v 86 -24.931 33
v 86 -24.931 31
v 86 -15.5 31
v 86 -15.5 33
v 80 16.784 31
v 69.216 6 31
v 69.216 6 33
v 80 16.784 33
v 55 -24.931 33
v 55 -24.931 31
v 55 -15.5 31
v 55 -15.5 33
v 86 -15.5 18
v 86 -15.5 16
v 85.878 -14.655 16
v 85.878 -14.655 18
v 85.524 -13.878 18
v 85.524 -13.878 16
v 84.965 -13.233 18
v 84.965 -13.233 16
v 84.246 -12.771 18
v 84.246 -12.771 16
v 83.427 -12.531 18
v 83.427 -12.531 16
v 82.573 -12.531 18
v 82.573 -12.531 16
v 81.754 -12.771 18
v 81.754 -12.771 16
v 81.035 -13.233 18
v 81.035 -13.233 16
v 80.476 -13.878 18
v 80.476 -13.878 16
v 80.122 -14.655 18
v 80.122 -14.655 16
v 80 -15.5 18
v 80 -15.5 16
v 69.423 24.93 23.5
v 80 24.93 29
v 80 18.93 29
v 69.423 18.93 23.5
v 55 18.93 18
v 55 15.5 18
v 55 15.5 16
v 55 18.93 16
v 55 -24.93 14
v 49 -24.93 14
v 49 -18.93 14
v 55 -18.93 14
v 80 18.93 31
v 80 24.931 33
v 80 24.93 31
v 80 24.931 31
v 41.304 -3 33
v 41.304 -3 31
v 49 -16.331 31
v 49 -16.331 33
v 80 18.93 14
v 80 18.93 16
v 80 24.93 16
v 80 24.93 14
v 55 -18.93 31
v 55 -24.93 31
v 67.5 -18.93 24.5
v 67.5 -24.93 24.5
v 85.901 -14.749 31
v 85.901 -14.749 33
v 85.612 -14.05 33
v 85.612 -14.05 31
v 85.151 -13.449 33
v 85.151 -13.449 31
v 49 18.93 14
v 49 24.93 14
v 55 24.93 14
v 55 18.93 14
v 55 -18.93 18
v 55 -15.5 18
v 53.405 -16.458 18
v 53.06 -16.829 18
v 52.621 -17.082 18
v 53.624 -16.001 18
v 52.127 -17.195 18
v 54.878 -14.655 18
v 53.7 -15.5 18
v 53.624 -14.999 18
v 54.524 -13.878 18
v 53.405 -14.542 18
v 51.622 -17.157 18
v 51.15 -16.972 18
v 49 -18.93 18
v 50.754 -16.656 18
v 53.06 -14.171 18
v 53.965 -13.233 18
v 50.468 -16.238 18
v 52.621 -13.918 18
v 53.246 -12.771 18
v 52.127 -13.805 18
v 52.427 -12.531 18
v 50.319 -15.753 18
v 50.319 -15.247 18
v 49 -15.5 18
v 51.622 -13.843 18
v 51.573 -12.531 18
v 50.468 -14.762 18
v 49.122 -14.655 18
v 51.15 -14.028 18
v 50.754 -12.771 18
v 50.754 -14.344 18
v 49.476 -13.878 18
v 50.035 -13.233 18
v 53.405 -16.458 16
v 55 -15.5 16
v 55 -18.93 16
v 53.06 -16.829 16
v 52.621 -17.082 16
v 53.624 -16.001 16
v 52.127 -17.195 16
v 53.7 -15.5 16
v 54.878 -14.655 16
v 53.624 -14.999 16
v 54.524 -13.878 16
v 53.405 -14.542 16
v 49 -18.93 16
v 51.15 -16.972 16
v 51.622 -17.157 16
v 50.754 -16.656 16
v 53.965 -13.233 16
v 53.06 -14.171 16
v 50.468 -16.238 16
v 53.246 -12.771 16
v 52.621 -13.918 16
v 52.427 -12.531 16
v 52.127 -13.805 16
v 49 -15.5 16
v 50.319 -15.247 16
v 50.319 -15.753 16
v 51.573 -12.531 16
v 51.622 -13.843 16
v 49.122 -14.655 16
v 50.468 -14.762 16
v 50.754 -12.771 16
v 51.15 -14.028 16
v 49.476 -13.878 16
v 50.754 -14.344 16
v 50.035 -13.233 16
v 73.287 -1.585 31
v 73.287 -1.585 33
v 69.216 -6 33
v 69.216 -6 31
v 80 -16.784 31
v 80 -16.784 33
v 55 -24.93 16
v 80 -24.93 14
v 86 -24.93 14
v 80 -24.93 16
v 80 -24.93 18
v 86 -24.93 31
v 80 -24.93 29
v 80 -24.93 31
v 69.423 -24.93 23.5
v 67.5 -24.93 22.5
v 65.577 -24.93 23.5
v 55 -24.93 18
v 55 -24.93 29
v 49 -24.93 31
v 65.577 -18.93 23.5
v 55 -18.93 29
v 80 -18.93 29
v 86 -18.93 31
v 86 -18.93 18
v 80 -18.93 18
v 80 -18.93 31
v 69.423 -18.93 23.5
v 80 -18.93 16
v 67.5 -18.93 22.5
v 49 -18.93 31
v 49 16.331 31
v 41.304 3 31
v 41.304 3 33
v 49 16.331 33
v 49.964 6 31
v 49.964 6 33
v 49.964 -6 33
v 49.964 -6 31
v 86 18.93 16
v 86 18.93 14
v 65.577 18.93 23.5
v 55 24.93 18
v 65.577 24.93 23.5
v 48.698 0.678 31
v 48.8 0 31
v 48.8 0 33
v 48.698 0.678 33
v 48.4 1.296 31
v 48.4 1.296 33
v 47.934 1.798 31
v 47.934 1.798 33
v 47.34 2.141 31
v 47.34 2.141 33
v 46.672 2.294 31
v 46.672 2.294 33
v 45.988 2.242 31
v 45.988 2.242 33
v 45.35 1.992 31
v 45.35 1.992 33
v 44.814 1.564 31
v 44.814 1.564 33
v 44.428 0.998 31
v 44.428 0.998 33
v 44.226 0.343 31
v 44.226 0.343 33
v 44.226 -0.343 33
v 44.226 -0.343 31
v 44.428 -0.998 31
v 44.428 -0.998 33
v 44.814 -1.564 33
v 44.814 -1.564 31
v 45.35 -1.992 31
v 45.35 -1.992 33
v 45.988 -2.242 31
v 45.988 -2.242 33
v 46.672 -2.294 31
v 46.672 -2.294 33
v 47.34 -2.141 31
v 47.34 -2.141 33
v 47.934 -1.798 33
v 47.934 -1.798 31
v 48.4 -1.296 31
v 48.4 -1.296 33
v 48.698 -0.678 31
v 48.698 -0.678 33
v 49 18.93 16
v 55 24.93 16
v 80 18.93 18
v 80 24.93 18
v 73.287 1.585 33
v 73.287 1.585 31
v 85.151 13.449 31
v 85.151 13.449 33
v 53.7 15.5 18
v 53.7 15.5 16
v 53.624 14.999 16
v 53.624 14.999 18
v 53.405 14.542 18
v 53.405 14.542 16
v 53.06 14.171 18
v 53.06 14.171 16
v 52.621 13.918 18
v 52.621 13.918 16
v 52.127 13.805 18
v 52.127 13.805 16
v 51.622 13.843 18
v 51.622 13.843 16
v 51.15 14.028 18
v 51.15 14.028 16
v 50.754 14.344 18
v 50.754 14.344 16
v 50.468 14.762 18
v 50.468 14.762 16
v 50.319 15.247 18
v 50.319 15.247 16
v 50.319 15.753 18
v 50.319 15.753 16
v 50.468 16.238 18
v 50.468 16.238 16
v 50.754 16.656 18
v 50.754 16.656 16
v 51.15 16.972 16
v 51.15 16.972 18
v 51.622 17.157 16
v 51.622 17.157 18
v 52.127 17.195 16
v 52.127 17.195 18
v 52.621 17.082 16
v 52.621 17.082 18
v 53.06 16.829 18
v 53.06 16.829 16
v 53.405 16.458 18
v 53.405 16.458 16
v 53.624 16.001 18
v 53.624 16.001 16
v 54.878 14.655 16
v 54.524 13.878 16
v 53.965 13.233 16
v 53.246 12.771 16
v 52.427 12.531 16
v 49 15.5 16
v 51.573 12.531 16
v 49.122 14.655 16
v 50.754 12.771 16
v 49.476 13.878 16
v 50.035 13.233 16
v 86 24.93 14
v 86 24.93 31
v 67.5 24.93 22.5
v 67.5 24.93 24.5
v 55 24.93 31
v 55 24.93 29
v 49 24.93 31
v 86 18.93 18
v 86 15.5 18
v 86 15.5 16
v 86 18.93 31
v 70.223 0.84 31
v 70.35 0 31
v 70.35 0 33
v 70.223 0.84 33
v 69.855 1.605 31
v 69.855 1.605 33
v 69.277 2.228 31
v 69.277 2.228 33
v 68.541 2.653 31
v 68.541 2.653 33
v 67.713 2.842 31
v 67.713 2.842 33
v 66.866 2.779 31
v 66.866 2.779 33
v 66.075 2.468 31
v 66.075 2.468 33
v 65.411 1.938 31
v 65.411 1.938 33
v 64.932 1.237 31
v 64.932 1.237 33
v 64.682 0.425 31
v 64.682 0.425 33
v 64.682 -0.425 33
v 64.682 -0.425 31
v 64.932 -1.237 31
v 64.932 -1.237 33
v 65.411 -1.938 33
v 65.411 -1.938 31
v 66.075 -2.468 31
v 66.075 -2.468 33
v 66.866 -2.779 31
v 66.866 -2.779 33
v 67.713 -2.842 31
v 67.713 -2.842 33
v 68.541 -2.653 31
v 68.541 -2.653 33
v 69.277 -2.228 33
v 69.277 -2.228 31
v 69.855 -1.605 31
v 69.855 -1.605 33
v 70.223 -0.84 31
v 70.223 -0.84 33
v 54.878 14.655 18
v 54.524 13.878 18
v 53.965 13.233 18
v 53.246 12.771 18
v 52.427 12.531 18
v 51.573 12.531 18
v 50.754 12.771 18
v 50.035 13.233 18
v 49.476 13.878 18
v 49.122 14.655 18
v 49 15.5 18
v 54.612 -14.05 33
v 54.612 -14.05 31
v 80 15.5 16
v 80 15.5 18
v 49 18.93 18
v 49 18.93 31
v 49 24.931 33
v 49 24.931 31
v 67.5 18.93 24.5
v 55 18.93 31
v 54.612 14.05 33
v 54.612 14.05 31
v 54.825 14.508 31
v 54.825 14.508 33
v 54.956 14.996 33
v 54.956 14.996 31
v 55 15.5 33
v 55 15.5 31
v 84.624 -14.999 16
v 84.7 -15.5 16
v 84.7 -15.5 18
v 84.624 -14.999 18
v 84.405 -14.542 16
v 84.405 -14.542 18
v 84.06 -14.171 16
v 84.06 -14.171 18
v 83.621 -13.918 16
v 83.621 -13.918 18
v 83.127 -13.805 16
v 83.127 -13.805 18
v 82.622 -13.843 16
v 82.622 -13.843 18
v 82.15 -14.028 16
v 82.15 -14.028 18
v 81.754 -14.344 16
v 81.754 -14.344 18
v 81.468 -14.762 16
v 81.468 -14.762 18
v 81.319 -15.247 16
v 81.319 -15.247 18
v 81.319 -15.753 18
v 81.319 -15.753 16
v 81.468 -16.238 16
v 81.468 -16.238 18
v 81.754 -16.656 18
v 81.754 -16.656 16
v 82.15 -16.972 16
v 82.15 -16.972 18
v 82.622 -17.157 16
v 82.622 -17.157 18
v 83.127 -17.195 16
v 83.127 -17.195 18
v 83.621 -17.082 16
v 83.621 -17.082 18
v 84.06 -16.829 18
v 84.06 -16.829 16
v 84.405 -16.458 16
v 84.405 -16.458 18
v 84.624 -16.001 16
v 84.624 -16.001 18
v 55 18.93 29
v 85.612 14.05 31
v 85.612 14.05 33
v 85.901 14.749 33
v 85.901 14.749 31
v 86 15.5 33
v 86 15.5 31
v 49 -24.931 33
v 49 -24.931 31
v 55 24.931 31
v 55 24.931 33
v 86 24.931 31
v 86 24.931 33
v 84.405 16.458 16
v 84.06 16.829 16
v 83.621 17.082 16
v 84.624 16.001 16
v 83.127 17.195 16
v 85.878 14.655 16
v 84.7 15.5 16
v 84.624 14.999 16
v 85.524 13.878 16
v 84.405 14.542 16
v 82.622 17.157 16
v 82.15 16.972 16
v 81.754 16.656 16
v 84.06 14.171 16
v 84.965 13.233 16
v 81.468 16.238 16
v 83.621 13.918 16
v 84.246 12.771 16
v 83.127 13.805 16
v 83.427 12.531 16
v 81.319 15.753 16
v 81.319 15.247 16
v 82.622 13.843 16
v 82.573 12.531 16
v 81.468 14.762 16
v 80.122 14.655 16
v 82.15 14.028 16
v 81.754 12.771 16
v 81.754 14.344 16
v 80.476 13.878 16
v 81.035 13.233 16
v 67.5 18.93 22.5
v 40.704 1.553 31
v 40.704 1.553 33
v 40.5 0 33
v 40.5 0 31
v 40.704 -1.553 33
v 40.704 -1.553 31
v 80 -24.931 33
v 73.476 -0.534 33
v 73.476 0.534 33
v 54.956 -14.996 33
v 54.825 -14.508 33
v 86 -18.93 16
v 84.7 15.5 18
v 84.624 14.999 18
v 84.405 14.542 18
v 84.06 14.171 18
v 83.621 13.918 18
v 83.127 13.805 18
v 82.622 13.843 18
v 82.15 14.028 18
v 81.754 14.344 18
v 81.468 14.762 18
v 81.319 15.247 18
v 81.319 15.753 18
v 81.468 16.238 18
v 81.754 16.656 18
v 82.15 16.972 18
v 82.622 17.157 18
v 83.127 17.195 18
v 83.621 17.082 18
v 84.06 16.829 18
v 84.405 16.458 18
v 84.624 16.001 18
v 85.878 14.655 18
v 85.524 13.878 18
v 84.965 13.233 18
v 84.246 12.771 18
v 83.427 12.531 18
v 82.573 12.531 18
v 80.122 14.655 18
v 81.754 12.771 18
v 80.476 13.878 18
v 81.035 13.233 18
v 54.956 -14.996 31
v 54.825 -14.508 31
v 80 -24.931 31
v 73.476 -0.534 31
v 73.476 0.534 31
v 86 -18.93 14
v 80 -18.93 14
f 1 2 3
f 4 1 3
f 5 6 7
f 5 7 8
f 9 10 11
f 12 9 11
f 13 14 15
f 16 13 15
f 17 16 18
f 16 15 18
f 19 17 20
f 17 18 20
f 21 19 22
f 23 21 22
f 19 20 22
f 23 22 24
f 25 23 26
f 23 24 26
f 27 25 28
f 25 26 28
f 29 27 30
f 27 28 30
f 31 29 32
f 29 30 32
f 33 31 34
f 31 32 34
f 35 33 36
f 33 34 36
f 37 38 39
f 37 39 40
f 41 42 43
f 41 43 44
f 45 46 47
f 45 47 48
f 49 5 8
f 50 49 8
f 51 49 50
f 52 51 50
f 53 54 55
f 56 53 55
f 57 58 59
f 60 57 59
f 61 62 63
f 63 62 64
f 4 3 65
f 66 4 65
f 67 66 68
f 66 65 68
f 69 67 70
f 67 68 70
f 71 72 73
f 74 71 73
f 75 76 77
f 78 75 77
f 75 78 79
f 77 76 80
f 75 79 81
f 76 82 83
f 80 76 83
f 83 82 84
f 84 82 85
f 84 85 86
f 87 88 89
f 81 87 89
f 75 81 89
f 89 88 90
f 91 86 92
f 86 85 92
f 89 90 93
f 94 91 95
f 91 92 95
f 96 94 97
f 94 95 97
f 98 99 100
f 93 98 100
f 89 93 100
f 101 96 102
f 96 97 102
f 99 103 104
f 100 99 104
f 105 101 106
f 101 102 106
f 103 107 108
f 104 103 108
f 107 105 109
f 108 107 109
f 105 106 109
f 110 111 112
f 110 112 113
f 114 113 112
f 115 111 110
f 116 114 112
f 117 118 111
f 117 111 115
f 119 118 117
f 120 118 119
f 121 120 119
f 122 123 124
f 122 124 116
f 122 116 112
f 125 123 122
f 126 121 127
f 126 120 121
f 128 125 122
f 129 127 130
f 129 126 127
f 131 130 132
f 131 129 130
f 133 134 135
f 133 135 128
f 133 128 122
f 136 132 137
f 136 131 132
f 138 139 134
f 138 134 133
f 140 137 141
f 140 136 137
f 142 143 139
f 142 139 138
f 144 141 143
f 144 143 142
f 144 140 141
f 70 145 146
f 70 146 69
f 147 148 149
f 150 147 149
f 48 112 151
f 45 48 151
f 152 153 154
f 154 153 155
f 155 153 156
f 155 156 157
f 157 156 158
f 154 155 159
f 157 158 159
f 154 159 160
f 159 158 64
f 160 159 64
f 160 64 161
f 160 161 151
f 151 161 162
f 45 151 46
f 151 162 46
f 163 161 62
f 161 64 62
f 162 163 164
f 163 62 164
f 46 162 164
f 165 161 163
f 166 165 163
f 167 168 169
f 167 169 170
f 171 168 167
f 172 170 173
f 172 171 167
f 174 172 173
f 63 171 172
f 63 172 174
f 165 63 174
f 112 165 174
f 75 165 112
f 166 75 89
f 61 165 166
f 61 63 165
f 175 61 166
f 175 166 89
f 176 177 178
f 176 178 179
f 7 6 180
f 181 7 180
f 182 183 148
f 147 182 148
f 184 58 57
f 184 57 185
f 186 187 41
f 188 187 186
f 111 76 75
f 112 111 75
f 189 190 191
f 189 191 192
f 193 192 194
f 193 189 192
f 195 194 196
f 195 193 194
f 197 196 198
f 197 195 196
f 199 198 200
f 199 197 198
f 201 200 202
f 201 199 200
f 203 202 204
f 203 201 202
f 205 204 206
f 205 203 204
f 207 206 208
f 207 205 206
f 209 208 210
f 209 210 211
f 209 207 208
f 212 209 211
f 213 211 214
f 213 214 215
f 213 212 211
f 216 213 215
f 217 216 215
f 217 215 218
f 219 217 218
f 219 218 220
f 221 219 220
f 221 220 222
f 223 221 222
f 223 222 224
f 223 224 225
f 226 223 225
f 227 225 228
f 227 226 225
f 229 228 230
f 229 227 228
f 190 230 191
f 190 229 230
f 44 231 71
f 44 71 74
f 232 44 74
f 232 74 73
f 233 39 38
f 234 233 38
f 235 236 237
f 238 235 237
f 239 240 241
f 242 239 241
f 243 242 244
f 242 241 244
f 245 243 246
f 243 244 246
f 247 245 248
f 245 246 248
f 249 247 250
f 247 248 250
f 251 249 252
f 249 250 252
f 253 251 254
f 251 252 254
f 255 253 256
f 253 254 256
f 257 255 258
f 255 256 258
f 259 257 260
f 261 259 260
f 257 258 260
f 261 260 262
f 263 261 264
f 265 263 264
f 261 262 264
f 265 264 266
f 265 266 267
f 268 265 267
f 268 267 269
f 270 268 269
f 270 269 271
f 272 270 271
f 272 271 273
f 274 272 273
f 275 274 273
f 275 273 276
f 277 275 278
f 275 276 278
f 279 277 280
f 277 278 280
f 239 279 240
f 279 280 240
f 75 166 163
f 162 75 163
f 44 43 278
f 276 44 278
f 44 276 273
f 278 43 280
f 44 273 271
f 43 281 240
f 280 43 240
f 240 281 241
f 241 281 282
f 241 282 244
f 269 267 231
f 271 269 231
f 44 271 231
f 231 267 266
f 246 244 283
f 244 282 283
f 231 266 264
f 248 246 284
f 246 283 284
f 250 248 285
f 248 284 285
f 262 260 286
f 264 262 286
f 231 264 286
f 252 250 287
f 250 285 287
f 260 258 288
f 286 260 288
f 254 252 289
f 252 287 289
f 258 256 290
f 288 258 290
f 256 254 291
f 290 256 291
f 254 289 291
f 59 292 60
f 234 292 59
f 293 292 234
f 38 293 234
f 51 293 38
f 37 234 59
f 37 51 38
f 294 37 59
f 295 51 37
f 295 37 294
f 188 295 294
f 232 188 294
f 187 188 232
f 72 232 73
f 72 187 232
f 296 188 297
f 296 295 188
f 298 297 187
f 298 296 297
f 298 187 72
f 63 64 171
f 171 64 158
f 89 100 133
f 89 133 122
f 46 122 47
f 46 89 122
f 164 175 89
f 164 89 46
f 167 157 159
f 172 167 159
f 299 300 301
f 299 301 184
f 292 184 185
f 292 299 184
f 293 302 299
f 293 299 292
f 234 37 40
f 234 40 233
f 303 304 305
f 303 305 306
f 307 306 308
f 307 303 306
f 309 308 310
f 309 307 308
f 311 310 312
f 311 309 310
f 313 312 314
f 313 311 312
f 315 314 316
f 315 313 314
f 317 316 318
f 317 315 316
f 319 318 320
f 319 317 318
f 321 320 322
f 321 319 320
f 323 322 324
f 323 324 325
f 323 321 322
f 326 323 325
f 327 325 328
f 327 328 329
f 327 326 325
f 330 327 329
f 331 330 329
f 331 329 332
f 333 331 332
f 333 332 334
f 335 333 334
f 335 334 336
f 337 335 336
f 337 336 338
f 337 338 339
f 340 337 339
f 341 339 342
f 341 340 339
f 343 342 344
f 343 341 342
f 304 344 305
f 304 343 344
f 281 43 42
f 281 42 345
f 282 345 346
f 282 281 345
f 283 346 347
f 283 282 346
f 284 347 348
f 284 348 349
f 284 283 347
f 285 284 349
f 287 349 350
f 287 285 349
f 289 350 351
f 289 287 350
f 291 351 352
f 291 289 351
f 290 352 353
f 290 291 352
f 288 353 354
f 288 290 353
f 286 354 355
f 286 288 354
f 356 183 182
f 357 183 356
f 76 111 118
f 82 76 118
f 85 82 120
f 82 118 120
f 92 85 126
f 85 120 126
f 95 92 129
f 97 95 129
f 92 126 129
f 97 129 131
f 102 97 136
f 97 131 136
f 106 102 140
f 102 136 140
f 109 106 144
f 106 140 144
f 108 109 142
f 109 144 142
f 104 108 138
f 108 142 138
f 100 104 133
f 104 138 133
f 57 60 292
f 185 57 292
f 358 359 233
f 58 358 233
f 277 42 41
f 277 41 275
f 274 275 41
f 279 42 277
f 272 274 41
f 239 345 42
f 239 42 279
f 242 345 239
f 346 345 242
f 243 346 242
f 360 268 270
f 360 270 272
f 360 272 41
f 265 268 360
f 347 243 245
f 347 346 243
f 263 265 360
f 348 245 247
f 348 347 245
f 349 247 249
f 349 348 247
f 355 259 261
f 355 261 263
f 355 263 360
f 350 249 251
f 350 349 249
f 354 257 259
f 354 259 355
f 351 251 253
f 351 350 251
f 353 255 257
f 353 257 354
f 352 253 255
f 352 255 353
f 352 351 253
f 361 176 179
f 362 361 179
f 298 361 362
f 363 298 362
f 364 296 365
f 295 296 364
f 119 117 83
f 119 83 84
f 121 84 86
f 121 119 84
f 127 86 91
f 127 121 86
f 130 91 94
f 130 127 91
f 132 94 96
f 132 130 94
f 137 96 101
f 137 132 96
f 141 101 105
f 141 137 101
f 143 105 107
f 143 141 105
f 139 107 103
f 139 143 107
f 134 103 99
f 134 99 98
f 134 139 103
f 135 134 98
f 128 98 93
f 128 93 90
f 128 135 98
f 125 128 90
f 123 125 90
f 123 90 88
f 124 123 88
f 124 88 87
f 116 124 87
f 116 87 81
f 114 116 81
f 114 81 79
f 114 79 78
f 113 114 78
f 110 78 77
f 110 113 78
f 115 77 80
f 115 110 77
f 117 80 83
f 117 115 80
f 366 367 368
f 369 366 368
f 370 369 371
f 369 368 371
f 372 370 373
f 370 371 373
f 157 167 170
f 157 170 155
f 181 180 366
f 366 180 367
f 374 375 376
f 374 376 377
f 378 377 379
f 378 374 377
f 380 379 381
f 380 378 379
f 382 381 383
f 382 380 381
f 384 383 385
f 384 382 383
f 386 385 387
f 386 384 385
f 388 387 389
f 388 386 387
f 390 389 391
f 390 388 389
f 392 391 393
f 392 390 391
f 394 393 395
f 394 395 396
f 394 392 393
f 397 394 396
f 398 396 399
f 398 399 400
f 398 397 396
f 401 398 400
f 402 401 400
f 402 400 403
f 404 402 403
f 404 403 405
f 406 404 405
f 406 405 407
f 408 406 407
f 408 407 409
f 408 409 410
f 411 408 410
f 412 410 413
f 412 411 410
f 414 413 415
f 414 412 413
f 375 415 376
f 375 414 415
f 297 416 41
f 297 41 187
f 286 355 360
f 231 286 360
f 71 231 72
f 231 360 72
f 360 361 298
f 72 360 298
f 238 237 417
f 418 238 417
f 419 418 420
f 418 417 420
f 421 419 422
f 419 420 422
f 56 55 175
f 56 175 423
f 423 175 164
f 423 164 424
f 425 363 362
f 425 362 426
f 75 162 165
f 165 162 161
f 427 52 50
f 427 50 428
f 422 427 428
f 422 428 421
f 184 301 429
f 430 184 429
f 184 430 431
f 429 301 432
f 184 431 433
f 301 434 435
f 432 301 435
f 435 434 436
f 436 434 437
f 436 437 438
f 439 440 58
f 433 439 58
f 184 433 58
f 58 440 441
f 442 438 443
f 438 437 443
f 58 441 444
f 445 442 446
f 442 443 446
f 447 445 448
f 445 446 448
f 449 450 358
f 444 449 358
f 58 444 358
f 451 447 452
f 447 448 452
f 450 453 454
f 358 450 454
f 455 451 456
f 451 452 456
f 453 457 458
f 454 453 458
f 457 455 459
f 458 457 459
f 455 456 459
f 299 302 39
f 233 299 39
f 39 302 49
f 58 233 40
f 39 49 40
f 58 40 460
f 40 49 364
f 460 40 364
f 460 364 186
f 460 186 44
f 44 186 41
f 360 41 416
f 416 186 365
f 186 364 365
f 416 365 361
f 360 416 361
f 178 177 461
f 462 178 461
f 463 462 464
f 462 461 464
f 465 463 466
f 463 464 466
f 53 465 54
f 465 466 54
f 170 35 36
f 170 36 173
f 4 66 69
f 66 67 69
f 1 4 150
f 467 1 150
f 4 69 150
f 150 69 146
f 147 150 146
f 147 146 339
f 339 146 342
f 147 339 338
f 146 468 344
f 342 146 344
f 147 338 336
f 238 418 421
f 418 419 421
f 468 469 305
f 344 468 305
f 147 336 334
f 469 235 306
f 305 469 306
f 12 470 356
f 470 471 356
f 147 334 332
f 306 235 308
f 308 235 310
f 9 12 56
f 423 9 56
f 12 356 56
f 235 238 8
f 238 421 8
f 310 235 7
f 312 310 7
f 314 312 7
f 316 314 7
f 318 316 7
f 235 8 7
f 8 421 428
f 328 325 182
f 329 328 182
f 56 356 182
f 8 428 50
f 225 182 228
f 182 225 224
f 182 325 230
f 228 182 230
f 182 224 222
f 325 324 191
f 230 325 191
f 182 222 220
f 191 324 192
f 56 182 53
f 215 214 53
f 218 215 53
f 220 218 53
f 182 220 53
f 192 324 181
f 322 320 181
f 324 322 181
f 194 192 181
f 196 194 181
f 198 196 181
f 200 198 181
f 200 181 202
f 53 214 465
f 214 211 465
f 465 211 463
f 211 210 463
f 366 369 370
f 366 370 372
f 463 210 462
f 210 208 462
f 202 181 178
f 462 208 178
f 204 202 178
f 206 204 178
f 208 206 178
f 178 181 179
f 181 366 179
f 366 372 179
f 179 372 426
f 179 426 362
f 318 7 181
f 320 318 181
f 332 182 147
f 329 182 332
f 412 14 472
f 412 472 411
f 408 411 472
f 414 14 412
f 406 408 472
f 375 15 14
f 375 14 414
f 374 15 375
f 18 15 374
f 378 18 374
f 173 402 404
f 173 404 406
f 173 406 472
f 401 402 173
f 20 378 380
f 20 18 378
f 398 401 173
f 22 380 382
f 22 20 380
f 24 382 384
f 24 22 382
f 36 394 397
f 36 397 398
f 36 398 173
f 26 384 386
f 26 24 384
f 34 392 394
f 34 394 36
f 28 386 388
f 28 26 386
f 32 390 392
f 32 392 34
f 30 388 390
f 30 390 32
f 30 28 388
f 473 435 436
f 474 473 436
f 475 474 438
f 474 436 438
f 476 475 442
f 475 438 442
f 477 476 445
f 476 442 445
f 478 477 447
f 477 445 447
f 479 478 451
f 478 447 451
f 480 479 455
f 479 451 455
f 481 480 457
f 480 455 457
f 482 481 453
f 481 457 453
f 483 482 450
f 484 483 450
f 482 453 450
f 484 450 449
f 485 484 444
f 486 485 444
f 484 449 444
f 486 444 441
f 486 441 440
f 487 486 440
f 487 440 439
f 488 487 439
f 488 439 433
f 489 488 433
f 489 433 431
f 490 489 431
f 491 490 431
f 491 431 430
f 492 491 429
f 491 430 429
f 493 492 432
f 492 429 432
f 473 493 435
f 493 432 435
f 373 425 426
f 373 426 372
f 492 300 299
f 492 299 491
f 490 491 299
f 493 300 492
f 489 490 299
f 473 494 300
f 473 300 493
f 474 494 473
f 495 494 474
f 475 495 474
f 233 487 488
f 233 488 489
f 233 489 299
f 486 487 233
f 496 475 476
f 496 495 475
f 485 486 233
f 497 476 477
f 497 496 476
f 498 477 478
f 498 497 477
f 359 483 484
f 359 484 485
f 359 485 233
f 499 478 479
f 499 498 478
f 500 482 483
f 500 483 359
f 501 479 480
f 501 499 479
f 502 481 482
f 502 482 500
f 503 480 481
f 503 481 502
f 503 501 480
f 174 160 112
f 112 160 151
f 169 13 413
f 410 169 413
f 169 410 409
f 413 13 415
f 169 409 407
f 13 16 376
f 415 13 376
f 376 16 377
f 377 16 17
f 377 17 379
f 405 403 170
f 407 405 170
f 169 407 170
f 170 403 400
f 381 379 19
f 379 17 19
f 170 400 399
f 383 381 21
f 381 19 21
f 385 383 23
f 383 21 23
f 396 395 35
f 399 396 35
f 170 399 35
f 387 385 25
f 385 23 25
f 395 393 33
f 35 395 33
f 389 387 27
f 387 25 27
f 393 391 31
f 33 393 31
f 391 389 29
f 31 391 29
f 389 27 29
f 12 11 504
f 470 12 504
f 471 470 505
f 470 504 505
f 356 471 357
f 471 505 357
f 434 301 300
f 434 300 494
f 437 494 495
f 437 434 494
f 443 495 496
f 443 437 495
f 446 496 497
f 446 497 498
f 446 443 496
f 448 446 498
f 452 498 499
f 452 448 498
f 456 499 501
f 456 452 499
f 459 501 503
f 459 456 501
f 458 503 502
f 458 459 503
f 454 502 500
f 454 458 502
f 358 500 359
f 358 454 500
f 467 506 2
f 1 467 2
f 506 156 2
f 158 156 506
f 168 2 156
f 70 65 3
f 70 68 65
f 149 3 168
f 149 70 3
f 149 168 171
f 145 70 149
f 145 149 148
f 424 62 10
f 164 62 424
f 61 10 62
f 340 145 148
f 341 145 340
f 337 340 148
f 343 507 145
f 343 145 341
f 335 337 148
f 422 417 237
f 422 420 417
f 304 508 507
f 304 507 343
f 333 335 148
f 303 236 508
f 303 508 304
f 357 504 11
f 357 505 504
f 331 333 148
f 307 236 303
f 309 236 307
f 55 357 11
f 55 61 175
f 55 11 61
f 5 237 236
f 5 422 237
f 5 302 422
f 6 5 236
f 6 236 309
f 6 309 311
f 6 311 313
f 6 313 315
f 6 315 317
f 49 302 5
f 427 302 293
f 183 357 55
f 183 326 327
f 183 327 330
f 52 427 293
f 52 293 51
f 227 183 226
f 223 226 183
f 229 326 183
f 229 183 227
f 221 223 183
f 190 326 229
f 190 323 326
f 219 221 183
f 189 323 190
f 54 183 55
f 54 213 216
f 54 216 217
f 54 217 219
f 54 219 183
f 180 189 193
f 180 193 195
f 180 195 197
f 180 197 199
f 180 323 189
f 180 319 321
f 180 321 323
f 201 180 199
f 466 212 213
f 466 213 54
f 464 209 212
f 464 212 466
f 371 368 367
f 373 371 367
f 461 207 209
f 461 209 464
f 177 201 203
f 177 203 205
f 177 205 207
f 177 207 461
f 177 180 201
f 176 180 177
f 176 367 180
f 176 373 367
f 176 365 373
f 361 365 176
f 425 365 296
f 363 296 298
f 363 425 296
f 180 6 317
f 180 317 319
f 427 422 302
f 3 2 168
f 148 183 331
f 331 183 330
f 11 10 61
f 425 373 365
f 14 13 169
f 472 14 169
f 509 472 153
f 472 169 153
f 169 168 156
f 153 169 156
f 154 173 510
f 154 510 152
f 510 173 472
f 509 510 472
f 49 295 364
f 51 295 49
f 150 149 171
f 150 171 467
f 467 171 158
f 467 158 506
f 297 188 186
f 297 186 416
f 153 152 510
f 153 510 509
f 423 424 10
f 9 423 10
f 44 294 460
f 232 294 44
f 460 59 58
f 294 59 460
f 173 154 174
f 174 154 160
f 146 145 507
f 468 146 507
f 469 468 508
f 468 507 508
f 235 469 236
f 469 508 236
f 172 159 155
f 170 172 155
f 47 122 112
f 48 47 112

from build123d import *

# Parameters (mm, degrees)
SKETCH094_R                     = 2.3
SKETCH094_R_2                   = 2.85
PAD048_DEPTH                    = 2
SKETCH097_W                     = 6
SKETCH097_H                     = 6
PAD050_DEPTH                    = 17
SKETCH098_R                     = 1.7
PAD051_DEPTH                    = 2
SKETCH098_LINEARPATTERN001_2_R  = 1.7
PAD051_LINEARPATTERN001_2_DEPTH = 2
SKETCH097_LINEARPATTERN001_2_W  = 6
SKETCH097_LINEARPATTERN001_2_H  = 6
PAD050_LINEARPATTERN001_2_DEPTH = 17
PAD052_DEPTH                    = 6


with BuildPart() as part:
    # Sketch094 → Pad048 (new body)
    with BuildSketch(Plane.XY):
        with BuildLine():
            Line((3.464102, 6), (21, 6))
            Line((22.716302, 6), (21, 6))
            Line((22.716302, 6), (33.500258, 16.783955))
            Line((33.500258, 16.783955), (33.500258, 24.930573))
            Line((33.500258, 24.930573), (39.500258, 24.930573))
            Line((39.500258, 24.930573), (39.500258, 15.5))
            ThreePointArc((38.650792, 13.449208), (39.279489, 14.390119), (39.500258, 15.5))
            Line((26.786802, 1.585219), (38.650792, 13.449208))
            ThreePointArc((26.786802, -1.585219), (27, 0), (26.786802, 1.585219))
            Line((26.786802, -1.585219), (38.650792, -13.449208))
            ThreePointArc((39.500258, -15.5), (39.279489, -14.390119), (38.650792, -13.449208))
            Line((39.500258, -24.930573), (39.500258, -15.5))
            Line((33.500258, -24.930573), (39.500258, -24.930573))
            Line((33.500258, -16.783955), (33.500258, -24.930573))
            Line((22.716302, -6), (33.500258, -16.783955))
            Line((21, -6), (22.716302, -6))
            Line((3.464102, -6), (21, -6))
            Line((3.464102, -6), (8.111697, -14.049871))
            ThreePointArc((8.500258, -15.5), (8.401434, -14.749358), (8.111697, -14.049871))
            Line((8.500258, -24.930573), (8.500258, -15.5))
            Line((2.500258, -24.930573), (8.500258, -24.930573))
            Line((2.500258, -16.330573), (2.500258, -24.930573))
            Line((-5.196152, -3), (2.500258, -16.330573))
            ThreePointArc((-5.196152, 3), (-6, 0), (-5.196152, -3))
            Line((-5.196152, 3), (2.500258, 16.330573))
            Line((2.500258, 16.330573), (2.500258, 24.930573))
            Line((2.500258, 24.930573), (8.500258, 24.930573))
            Line((8.500258, 24.930573), (8.500258, 15.5))
            ThreePointArc((8.111697, 14.049871), (8.401434, 14.749358), (8.500258, 15.5))
            Line((3.464102, 6), (8.111697, 14.049871))
        make_face()
        Circle(SKETCH094_R, mode=Mode.SUBTRACT)
        with Locations((21, 0)):
            Circle(SKETCH094_R_2, mode=Mode.SUBTRACT)
    extrude(amount=PAD048_DEPTH)

    # Sketch097 (on Face33 of Pad048) → Pad050 (join)
    with BuildSketch(Plane(origin=(0, 0, 0), x_dir=(1, 0, 0), z_dir=(0, 0, -1))):
        with Locations((5.5, 21.93)):
            Rectangle(SKETCH097_W, SKETCH097_H)
    pad050 = extrude(amount=PAD050_DEPTH)

    # Sketch098 → Pad051 (join)
    with BuildSketch(Plane.XY.offset(-15)):
        with BuildLine():
            Line((2.5, -18.93), (2.5, -15.5))
            ThreePointArc((8.5, -15.5), (5.5, -12.5), (2.5, -15.5))
            Line((8.5, -18.93), (8.5, -15.5))
            Line((2.5, -18.93), (8.5, -18.93))
        make_face()
        with Locations((5.5, -15.5)):
            Circle(SKETCH098_R, mode=Mode.SUBTRACT)
    pad051 = extrude(amount=PAD051_DEPTH)

    # Sketch098 LinearPattern001 2 → Pad051 LinearPattern001 2 (add)
    with BuildSketch(Plane(origin=(31, 0, -15), x_dir=(1, 0, 0), z_dir=(0, 0, 1))):
        with BuildLine():
            Line((2.5, -18.93), (2.5, -15.5))
            ThreePointArc((8.5, -15.5), (5.5, -12.5), (2.5, -15.5))
            Line((8.5, -18.93), (8.5, -15.5))
            Line((2.5, -18.93), (8.5, -18.93))
        make_face()
        with Locations((5.5, -15.5)):
            Circle(SKETCH098_LINEARPATTERN001_2_R, mode=Mode.SUBTRACT)
    pad051_linearpattern001_2 = extrude(amount=PAD051_LINEARPATTERN001_2_DEPTH)

    # Sketch097 LinearPattern001 2 → Pad050 LinearPattern001 2 (add)
    with BuildSketch(Plane(origin=(31, 0, 0), x_dir=(1, 0, 0), z_dir=(0, 0, -1))):
        with Locations((5.5, 21.93)):
            Rectangle(SKETCH097_LINEARPATTERN001_2_W, SKETCH097_LINEARPATTERN001_2_H)
    pad050_linearpattern001_2 = extrude(amount=PAD050_LINEARPATTERN001_2_DEPTH)

    # Mirrored001: Pad051, Pad050, Pad051 LinearPattern001 2, Pad050 LinearPattern001 2 across Sketch098 H_Axis
    add(pad051.mirror(Plane(origin=(0, 0, -15), x_dir=(0, 0, 1), z_dir=(0, 1, 0))))
    add(pad050.mirror(Plane(origin=(0, 0, -15), x_dir=(0, 0, 1), z_dir=(0, 1, 0))))
    add(pad051_linearpattern001_2.mirror(Plane(origin=(0, 0, -15), x_dir=(0, 0, 1), z_dir=(0, 1, 0))))
    add(pad050_linearpattern001_2.mirror(Plane(origin=(0, 0, -15), x_dir=(0, 0, 1), z_dir=(0, 1, 0))))

    # Sketch099 (on Face36 of MultiTransform001) → Pad052 (join)
    with BuildSketch(Plane.XZ.offset(24.93)):
        Polygon((8.5, 0), (21, -6.5), (33.5, 0), (33.5, -2), (22.923077, -7.5), (33.5, -13), (33.5, -15), (21, -8.5), (8.5, -15), (8.5, -13), (19.076923, -7.5), (8.5, -2), align=None)
    pad052 = extrude(amount=-PAD052_DEPTH)

    # Mirrored002: Pad052 across XZ
    add(pad052.mirror(Plane.XZ))


with BuildPart() as part_1:
    # Body024 placement: moved
    add(part.part.moved(Location((46.5, 0, 31))))


solid = part_1.part
